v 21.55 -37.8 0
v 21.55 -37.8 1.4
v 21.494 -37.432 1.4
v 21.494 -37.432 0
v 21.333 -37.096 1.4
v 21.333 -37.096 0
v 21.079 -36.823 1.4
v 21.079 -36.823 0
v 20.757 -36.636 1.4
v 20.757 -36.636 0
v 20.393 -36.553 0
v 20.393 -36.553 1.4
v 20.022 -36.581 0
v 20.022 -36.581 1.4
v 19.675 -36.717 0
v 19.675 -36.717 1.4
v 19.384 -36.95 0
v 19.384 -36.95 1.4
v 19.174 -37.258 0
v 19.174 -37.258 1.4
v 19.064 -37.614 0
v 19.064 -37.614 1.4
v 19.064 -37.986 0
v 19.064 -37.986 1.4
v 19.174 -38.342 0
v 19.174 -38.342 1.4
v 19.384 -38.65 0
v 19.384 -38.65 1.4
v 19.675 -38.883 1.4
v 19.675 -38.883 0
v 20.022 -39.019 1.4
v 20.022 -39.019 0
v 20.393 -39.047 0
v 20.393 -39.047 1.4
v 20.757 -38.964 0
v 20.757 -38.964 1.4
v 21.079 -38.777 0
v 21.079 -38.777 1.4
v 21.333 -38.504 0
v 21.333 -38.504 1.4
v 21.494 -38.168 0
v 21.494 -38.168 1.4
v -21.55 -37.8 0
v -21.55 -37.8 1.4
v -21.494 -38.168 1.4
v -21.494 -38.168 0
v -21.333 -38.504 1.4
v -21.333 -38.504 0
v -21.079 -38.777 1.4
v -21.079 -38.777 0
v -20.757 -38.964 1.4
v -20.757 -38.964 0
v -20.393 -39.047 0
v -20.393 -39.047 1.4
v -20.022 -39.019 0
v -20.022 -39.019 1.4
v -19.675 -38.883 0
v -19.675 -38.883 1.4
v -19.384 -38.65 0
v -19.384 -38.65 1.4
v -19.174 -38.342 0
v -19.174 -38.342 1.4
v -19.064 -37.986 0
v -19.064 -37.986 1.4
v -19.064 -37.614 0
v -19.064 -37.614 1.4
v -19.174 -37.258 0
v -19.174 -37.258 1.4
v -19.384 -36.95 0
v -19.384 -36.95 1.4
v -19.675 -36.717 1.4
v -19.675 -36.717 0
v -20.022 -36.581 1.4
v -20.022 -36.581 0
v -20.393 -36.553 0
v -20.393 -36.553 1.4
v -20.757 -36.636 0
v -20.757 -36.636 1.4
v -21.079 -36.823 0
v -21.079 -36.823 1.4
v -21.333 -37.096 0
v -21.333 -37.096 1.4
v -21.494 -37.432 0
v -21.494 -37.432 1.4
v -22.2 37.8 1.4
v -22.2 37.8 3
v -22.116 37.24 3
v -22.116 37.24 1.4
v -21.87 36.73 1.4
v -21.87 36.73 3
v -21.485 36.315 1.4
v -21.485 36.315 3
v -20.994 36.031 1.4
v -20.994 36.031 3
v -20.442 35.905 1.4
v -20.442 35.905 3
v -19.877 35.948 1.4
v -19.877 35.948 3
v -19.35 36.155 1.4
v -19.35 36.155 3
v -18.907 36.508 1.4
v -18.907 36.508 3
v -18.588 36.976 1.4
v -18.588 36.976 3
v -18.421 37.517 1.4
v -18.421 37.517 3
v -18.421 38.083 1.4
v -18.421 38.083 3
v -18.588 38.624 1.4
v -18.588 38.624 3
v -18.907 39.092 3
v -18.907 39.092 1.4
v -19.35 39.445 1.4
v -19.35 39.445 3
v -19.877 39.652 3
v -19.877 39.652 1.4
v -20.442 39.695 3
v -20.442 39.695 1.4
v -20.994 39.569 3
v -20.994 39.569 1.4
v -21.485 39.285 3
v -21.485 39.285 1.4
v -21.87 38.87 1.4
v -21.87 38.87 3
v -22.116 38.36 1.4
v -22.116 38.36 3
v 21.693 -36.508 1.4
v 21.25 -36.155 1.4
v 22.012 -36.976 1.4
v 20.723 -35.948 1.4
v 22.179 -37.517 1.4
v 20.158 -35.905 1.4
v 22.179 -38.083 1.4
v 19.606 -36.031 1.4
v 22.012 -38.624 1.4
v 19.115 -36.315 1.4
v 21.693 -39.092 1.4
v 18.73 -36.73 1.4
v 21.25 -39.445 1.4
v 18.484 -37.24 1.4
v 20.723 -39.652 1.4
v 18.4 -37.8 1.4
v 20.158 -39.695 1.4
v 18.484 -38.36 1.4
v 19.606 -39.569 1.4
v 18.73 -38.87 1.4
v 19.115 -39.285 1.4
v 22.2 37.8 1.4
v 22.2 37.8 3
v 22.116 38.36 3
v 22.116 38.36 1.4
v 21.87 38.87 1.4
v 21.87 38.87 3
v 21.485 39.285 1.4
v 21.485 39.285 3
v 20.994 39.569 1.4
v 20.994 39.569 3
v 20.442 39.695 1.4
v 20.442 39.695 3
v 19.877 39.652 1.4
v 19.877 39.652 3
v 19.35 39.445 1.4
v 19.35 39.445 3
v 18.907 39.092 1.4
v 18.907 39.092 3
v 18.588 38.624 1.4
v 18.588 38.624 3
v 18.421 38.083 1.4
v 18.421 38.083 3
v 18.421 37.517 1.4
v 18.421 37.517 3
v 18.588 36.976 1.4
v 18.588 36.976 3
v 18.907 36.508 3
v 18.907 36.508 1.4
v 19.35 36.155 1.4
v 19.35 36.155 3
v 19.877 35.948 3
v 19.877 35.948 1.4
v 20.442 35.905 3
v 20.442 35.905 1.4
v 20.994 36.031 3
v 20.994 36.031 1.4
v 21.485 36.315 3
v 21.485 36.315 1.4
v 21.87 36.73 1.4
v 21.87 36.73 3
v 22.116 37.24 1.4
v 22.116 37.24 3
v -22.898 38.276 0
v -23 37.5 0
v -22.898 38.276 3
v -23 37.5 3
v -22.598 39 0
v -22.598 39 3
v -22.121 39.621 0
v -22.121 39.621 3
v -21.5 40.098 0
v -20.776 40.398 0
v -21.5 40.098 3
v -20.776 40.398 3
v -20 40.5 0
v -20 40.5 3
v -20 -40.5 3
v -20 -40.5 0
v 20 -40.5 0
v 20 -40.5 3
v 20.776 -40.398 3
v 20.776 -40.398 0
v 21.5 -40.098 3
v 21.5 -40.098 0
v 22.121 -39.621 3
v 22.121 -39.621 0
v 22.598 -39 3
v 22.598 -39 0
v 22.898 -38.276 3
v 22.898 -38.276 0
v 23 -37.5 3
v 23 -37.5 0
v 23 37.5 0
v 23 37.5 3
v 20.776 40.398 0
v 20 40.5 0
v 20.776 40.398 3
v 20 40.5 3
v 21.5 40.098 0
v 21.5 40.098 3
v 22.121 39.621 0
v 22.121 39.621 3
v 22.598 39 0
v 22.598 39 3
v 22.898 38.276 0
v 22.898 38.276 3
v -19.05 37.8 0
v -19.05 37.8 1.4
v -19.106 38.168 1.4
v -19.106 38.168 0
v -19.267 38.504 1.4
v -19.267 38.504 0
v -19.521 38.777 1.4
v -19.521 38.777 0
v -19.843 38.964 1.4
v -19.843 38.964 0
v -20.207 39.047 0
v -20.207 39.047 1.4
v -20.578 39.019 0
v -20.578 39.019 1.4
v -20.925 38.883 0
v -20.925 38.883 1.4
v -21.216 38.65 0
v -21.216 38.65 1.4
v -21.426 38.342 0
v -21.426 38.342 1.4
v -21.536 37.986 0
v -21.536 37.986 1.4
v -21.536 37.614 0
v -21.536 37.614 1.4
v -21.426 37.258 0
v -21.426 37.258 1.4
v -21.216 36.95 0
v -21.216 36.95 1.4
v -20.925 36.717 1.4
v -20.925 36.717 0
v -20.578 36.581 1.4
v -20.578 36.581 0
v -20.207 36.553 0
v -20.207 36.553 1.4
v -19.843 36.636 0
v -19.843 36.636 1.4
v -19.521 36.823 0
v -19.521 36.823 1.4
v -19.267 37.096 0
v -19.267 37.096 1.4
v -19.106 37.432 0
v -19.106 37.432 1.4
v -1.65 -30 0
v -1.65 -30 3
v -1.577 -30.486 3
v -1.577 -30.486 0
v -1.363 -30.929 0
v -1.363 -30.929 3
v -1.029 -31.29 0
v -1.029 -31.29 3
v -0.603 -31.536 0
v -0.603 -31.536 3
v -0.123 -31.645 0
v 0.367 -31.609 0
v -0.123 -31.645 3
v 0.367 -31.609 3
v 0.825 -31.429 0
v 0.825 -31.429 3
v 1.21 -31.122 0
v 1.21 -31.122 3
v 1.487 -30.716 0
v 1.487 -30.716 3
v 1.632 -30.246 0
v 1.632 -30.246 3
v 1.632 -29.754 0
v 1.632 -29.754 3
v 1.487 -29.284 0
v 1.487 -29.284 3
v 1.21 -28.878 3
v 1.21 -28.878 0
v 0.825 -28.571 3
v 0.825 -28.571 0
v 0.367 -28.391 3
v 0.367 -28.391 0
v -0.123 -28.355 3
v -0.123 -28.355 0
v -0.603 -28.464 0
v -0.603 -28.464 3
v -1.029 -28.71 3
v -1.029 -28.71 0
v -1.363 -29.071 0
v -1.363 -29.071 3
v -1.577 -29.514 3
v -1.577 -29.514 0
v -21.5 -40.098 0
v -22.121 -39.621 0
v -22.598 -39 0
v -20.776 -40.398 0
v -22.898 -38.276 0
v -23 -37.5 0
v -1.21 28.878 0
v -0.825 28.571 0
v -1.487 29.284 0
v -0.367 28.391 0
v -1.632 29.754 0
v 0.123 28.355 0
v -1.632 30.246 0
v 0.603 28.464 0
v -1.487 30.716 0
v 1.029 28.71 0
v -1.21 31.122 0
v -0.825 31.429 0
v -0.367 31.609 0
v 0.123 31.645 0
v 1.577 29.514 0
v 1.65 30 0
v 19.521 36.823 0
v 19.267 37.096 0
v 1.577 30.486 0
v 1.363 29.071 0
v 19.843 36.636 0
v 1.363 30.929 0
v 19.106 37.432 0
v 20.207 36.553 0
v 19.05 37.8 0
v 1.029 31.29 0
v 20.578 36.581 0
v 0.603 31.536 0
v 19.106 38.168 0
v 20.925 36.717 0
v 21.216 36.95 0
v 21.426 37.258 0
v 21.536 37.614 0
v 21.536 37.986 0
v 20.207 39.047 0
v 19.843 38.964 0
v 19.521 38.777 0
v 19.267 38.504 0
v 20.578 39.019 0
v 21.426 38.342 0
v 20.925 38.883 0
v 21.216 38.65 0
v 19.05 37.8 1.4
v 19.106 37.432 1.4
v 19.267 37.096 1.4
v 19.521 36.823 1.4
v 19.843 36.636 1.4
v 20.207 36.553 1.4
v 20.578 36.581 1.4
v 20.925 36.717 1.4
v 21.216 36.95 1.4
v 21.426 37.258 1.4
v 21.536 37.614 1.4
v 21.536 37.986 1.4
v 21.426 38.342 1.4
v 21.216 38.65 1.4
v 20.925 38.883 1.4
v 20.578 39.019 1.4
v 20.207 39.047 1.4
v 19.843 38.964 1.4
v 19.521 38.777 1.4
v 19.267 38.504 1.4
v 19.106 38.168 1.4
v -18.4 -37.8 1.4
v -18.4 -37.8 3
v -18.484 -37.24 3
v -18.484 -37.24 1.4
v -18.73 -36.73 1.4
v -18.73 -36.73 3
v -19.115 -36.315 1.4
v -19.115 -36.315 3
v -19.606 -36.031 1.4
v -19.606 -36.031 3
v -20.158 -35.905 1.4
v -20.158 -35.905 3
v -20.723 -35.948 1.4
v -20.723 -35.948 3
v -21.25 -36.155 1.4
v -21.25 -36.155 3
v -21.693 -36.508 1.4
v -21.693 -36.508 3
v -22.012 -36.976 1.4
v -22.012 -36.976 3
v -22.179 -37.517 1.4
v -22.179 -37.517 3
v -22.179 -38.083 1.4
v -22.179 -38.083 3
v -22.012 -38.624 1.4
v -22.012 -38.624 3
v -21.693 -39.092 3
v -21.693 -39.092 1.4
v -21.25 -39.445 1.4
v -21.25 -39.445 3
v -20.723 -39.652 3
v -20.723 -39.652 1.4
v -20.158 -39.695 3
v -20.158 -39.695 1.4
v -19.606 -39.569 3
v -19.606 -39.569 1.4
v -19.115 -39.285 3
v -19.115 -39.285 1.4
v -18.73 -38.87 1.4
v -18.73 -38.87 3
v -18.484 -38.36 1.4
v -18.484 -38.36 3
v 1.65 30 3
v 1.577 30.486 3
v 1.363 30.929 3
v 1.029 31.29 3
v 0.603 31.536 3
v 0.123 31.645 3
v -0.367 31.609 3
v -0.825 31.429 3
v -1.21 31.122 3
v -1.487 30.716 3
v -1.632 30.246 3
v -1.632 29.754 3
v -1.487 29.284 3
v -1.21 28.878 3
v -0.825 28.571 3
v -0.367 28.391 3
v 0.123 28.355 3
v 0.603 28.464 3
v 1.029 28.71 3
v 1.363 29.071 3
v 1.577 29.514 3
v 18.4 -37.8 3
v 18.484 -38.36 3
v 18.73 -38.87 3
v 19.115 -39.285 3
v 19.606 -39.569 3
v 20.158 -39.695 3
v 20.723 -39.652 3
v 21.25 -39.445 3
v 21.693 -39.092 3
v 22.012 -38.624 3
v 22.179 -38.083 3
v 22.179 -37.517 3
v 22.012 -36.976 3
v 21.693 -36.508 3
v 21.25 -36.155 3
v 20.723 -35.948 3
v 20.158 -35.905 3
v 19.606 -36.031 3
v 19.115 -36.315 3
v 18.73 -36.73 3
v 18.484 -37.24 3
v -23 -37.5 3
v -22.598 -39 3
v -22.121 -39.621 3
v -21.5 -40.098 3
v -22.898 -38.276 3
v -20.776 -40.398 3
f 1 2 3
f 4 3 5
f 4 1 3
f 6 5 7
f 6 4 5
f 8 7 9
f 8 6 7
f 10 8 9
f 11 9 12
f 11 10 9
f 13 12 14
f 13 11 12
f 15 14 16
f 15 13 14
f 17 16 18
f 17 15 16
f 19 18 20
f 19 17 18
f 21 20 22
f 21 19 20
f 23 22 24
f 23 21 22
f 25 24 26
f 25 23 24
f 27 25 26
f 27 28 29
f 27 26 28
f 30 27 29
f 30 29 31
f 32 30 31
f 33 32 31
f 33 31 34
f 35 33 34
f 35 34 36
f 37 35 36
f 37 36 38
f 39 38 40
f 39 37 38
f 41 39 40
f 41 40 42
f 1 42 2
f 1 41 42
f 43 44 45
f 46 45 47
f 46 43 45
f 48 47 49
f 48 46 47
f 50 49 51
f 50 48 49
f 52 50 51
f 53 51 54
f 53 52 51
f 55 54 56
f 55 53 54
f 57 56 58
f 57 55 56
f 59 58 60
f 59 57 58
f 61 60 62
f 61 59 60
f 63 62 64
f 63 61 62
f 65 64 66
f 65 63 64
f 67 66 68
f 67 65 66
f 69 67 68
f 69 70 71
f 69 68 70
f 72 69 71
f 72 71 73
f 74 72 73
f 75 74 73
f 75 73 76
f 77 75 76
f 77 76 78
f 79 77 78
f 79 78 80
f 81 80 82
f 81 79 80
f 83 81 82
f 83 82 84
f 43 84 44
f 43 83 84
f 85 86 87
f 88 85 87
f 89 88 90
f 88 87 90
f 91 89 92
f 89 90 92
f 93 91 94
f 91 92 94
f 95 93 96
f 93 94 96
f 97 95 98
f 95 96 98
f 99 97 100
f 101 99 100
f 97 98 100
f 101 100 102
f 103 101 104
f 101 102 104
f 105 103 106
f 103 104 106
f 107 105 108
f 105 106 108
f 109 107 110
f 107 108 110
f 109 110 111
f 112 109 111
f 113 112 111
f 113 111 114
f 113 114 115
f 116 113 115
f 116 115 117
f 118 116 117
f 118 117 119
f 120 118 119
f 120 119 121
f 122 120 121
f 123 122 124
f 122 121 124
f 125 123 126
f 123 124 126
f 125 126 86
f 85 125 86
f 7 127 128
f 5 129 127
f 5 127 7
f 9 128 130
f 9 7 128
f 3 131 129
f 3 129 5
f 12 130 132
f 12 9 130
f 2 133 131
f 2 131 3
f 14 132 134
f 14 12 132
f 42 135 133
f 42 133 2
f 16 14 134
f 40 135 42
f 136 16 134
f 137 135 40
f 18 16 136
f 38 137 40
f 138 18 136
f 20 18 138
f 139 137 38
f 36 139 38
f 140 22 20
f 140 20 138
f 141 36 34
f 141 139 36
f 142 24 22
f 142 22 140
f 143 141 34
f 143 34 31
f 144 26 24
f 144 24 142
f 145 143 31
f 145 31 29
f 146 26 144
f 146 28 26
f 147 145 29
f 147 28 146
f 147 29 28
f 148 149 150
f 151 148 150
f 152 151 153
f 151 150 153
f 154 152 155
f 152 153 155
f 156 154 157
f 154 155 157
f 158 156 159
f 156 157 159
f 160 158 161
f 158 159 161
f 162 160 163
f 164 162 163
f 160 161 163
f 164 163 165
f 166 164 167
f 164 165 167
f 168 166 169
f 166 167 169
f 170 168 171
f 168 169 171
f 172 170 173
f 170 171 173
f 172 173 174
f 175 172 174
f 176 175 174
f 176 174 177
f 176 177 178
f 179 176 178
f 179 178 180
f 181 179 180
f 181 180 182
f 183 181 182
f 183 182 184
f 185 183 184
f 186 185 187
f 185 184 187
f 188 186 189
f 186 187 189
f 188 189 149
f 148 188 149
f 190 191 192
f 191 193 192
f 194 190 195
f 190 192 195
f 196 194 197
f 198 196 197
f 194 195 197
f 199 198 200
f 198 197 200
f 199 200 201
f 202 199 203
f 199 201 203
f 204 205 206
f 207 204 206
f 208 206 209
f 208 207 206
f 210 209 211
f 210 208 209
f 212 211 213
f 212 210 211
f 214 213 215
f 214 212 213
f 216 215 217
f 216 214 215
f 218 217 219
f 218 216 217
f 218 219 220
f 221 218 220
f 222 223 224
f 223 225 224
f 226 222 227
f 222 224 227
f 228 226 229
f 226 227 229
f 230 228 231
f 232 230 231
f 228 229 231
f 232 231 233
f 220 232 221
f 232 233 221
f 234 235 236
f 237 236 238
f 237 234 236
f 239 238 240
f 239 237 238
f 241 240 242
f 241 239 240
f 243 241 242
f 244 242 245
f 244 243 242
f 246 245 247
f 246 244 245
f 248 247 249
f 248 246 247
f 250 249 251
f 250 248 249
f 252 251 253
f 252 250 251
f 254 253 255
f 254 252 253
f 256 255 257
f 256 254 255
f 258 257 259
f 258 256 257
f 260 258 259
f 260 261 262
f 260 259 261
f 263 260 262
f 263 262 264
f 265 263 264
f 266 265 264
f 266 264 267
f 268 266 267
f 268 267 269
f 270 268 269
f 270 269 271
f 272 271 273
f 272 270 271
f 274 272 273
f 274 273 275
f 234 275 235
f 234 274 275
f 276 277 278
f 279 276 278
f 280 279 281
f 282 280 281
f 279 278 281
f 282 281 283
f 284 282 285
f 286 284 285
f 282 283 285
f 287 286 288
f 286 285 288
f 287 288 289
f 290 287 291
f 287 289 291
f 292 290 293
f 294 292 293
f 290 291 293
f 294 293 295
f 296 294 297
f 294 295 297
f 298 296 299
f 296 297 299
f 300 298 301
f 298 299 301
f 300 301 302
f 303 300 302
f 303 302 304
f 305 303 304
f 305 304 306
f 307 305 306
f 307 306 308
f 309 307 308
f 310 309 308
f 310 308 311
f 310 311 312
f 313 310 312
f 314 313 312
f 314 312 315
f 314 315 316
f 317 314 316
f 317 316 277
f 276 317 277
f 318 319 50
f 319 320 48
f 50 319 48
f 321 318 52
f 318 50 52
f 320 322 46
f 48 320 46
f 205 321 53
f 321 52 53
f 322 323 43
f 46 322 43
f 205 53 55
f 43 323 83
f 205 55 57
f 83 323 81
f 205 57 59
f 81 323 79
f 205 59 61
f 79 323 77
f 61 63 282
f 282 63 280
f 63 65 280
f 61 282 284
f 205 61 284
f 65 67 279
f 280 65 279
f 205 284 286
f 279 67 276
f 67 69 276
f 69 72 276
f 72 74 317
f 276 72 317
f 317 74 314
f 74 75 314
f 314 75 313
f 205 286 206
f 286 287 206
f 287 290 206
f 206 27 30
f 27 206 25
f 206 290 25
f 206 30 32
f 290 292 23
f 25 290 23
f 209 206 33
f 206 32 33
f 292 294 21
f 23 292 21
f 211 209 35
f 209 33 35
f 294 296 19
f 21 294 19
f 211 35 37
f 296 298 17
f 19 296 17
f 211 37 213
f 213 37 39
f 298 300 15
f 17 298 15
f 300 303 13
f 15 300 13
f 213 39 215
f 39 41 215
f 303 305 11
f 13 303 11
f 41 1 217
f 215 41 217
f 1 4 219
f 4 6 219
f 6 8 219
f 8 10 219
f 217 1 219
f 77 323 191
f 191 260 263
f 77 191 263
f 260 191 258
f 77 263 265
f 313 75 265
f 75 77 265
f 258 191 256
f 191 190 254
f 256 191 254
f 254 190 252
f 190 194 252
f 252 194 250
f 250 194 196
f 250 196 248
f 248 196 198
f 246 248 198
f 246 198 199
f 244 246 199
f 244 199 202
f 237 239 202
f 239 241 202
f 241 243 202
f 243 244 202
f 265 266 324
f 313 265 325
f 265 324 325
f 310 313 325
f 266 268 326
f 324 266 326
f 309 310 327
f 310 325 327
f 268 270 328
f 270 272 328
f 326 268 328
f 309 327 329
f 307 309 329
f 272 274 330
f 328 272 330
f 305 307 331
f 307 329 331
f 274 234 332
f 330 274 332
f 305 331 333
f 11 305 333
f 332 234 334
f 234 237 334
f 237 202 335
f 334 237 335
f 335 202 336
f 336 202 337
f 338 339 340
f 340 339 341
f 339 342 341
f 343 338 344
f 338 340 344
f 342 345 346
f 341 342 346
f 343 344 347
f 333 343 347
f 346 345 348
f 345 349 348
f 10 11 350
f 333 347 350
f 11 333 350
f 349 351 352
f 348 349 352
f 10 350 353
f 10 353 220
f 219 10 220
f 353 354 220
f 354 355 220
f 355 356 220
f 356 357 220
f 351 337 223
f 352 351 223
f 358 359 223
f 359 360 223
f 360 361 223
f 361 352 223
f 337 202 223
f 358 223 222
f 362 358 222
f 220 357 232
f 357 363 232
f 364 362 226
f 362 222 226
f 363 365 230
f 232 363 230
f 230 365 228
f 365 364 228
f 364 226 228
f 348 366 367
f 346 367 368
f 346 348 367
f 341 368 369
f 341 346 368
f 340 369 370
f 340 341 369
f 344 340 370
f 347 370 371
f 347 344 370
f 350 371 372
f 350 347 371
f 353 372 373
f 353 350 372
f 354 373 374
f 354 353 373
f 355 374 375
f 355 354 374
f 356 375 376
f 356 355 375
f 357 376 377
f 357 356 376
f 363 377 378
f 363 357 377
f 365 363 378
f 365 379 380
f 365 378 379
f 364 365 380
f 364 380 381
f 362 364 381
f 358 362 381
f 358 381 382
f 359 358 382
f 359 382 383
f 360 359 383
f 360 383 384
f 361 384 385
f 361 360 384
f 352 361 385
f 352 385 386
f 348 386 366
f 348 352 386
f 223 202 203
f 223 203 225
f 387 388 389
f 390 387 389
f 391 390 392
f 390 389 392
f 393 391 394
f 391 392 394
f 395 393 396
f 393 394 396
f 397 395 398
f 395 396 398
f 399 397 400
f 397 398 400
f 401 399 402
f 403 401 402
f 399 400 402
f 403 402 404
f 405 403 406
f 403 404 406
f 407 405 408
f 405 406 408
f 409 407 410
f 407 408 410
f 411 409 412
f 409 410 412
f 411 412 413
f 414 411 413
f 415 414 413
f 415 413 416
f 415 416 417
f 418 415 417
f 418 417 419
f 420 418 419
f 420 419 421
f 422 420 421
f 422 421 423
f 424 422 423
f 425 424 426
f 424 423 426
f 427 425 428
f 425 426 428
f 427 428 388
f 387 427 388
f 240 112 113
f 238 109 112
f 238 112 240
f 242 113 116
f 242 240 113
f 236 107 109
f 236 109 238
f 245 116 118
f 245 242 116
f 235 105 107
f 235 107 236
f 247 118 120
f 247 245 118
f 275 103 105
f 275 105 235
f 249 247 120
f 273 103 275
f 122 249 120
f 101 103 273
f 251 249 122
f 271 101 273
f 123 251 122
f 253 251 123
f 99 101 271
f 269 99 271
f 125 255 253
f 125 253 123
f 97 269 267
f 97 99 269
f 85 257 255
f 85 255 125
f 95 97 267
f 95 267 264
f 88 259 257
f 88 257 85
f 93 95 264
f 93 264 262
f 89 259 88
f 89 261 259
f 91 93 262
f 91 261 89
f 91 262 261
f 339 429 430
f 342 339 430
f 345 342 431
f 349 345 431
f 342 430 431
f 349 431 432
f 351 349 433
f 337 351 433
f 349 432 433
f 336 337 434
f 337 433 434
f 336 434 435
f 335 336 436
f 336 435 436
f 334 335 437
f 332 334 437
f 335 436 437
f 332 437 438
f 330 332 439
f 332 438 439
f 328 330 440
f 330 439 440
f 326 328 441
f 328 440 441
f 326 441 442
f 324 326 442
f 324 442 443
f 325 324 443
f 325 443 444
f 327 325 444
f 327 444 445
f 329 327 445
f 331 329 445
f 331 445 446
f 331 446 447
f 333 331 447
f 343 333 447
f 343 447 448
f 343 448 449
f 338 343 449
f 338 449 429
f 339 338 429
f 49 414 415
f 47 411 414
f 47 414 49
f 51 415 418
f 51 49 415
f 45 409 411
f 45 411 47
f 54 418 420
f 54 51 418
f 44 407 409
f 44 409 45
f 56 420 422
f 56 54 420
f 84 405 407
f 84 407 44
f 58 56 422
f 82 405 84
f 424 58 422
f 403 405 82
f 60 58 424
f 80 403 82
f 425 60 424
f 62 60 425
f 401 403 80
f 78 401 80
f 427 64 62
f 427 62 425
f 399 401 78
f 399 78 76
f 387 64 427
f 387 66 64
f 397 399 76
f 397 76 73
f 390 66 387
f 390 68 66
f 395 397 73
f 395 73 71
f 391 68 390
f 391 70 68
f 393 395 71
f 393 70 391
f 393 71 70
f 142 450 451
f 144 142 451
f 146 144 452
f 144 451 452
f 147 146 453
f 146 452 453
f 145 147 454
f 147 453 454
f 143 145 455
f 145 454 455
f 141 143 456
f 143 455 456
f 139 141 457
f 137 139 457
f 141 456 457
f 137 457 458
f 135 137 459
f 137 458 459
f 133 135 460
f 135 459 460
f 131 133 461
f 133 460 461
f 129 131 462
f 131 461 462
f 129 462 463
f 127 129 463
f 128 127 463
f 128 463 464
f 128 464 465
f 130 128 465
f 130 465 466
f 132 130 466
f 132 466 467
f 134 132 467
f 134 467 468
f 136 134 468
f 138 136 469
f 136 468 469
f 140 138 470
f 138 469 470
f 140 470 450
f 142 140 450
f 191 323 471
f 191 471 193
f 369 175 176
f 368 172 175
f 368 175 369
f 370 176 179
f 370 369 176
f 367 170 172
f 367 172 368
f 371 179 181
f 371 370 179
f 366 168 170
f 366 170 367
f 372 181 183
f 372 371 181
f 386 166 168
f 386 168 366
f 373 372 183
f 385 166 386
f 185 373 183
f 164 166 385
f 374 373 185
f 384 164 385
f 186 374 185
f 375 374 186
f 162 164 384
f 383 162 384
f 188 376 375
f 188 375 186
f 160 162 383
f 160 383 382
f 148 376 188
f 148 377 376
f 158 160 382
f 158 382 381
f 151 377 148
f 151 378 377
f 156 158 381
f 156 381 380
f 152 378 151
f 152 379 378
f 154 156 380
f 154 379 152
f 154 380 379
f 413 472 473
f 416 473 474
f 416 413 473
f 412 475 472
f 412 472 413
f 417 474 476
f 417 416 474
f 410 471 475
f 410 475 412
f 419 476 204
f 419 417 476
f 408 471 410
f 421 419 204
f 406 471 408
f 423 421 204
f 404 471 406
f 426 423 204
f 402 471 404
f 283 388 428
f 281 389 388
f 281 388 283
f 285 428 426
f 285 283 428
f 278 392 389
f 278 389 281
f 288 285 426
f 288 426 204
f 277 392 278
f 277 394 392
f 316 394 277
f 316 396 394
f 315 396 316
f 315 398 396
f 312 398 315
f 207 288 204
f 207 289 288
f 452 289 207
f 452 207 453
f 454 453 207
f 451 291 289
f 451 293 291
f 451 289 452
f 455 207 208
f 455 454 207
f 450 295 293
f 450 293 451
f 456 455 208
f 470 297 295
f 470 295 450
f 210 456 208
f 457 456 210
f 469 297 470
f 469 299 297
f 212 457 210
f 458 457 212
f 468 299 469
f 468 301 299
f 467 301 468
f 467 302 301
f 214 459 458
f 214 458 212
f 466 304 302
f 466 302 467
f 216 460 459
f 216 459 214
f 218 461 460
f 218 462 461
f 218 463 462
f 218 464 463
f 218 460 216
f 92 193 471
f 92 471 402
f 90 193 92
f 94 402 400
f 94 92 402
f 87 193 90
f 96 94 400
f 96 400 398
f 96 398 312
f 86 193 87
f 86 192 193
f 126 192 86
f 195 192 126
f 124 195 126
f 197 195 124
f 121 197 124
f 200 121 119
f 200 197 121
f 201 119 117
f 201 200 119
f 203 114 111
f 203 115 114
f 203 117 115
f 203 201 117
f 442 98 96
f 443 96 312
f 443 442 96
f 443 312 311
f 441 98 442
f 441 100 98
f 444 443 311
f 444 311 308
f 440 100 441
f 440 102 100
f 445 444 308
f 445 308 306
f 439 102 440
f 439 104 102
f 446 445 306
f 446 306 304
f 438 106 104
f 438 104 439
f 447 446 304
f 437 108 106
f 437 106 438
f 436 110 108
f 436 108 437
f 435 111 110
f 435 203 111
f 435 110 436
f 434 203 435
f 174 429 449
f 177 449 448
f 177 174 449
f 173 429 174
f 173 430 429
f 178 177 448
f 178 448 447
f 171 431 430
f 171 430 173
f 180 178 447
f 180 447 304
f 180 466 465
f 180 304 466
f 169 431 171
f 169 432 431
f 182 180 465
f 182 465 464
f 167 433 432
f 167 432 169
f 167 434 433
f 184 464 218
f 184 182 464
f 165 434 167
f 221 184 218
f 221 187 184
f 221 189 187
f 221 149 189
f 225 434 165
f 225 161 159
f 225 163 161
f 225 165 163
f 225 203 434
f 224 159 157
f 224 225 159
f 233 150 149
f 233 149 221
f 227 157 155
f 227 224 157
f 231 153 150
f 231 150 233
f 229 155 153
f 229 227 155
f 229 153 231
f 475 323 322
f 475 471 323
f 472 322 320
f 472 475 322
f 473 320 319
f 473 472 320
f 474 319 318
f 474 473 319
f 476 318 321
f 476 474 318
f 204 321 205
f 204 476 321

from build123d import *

# Parameters (mm, degrees)
SKETCH1_W           = 46
SKETCH1_H           = 81
SKETCH1_R           = 1.25
BOSS_EXTRUDE1_DEPTH = 3
FILLET1_R           = 3
SKETCH4_R           = 1.9
CUT_EXTRUDE2_DEPTH  = 1.6
SKETCH5_R           = 1.65
CUT_EXTRUDE3_DEPTH  = 10


with BuildPart() as part:
    # Sketch1 → Boss-Extrude1 (new body)
    with BuildSketch(Plane.XY):
        Rectangle(SKETCH1_W, SKETCH1_H)
        with Locations((-20.3, 37.8)):
            Circle(SKETCH1_R, mode=Mode.SUBTRACT)
        with Locations(Location((20.3, 37.8, 0), (0, 0, 180))):
            Circle(SKETCH1_R, mode=Mode.SUBTRACT)
        with Locations((20.3, -37.8)):
            Circle(SKETCH1_R, mode=Mode.SUBTRACT)
        with Locations(Location((-20.3, -37.8, 0), (0, 0, 180))):
            Circle(SKETCH1_R, mode=Mode.SUBTRACT)
    extrude(amount=BOSS_EXTRUDE1_DEPTH)

    # Fillet1
    fillet1_edges = [part.edges().sort_by_distance(p)[0] for p in [
        (23, -40.5, 1.5),
        (-23, -40.5, 1.5),
        (-23, 40.5, 1.5),
        (23, 40.5, 1.5),
    ]]
    fillet(fillet1_edges, radius=FILLET1_R)

    # Sketch4 → Cut-Extrude2 (cut)
    with BuildSketch(Plane.XY.offset(3)):
        with Locations((20.3, 37.8)):
            Circle(SKETCH4_R)
        with Locations(Location((-20.3, 37.8, 0), (0, 0, 180))):
            Circle(SKETCH4_R)
        with Locations((-20.3, -37.8)):
            Circle(SKETCH4_R)
        with Locations(Location((20.3, -37.8, 0), (0, 0, 180))):
            Circle(SKETCH4_R)
    extrude(amount=-CUT_EXTRUDE2_DEPTH, mode=Mode.SUBTRACT)

    # Sketch5 → Cut-Extrude3 (cut)
    with BuildSketch(Plane.XY.offset(3)):
        with Locations((0, 30)):
            Circle(SKETCH5_R)
        with Locations(Location((0, -30, 0), (0, 0, 180))):
            Circle(SKETCH5_R)
    extrude(amount=-CUT_EXTRUDE3_DEPTH, mode=Mode.SUBTRACT)


solid = part.part
